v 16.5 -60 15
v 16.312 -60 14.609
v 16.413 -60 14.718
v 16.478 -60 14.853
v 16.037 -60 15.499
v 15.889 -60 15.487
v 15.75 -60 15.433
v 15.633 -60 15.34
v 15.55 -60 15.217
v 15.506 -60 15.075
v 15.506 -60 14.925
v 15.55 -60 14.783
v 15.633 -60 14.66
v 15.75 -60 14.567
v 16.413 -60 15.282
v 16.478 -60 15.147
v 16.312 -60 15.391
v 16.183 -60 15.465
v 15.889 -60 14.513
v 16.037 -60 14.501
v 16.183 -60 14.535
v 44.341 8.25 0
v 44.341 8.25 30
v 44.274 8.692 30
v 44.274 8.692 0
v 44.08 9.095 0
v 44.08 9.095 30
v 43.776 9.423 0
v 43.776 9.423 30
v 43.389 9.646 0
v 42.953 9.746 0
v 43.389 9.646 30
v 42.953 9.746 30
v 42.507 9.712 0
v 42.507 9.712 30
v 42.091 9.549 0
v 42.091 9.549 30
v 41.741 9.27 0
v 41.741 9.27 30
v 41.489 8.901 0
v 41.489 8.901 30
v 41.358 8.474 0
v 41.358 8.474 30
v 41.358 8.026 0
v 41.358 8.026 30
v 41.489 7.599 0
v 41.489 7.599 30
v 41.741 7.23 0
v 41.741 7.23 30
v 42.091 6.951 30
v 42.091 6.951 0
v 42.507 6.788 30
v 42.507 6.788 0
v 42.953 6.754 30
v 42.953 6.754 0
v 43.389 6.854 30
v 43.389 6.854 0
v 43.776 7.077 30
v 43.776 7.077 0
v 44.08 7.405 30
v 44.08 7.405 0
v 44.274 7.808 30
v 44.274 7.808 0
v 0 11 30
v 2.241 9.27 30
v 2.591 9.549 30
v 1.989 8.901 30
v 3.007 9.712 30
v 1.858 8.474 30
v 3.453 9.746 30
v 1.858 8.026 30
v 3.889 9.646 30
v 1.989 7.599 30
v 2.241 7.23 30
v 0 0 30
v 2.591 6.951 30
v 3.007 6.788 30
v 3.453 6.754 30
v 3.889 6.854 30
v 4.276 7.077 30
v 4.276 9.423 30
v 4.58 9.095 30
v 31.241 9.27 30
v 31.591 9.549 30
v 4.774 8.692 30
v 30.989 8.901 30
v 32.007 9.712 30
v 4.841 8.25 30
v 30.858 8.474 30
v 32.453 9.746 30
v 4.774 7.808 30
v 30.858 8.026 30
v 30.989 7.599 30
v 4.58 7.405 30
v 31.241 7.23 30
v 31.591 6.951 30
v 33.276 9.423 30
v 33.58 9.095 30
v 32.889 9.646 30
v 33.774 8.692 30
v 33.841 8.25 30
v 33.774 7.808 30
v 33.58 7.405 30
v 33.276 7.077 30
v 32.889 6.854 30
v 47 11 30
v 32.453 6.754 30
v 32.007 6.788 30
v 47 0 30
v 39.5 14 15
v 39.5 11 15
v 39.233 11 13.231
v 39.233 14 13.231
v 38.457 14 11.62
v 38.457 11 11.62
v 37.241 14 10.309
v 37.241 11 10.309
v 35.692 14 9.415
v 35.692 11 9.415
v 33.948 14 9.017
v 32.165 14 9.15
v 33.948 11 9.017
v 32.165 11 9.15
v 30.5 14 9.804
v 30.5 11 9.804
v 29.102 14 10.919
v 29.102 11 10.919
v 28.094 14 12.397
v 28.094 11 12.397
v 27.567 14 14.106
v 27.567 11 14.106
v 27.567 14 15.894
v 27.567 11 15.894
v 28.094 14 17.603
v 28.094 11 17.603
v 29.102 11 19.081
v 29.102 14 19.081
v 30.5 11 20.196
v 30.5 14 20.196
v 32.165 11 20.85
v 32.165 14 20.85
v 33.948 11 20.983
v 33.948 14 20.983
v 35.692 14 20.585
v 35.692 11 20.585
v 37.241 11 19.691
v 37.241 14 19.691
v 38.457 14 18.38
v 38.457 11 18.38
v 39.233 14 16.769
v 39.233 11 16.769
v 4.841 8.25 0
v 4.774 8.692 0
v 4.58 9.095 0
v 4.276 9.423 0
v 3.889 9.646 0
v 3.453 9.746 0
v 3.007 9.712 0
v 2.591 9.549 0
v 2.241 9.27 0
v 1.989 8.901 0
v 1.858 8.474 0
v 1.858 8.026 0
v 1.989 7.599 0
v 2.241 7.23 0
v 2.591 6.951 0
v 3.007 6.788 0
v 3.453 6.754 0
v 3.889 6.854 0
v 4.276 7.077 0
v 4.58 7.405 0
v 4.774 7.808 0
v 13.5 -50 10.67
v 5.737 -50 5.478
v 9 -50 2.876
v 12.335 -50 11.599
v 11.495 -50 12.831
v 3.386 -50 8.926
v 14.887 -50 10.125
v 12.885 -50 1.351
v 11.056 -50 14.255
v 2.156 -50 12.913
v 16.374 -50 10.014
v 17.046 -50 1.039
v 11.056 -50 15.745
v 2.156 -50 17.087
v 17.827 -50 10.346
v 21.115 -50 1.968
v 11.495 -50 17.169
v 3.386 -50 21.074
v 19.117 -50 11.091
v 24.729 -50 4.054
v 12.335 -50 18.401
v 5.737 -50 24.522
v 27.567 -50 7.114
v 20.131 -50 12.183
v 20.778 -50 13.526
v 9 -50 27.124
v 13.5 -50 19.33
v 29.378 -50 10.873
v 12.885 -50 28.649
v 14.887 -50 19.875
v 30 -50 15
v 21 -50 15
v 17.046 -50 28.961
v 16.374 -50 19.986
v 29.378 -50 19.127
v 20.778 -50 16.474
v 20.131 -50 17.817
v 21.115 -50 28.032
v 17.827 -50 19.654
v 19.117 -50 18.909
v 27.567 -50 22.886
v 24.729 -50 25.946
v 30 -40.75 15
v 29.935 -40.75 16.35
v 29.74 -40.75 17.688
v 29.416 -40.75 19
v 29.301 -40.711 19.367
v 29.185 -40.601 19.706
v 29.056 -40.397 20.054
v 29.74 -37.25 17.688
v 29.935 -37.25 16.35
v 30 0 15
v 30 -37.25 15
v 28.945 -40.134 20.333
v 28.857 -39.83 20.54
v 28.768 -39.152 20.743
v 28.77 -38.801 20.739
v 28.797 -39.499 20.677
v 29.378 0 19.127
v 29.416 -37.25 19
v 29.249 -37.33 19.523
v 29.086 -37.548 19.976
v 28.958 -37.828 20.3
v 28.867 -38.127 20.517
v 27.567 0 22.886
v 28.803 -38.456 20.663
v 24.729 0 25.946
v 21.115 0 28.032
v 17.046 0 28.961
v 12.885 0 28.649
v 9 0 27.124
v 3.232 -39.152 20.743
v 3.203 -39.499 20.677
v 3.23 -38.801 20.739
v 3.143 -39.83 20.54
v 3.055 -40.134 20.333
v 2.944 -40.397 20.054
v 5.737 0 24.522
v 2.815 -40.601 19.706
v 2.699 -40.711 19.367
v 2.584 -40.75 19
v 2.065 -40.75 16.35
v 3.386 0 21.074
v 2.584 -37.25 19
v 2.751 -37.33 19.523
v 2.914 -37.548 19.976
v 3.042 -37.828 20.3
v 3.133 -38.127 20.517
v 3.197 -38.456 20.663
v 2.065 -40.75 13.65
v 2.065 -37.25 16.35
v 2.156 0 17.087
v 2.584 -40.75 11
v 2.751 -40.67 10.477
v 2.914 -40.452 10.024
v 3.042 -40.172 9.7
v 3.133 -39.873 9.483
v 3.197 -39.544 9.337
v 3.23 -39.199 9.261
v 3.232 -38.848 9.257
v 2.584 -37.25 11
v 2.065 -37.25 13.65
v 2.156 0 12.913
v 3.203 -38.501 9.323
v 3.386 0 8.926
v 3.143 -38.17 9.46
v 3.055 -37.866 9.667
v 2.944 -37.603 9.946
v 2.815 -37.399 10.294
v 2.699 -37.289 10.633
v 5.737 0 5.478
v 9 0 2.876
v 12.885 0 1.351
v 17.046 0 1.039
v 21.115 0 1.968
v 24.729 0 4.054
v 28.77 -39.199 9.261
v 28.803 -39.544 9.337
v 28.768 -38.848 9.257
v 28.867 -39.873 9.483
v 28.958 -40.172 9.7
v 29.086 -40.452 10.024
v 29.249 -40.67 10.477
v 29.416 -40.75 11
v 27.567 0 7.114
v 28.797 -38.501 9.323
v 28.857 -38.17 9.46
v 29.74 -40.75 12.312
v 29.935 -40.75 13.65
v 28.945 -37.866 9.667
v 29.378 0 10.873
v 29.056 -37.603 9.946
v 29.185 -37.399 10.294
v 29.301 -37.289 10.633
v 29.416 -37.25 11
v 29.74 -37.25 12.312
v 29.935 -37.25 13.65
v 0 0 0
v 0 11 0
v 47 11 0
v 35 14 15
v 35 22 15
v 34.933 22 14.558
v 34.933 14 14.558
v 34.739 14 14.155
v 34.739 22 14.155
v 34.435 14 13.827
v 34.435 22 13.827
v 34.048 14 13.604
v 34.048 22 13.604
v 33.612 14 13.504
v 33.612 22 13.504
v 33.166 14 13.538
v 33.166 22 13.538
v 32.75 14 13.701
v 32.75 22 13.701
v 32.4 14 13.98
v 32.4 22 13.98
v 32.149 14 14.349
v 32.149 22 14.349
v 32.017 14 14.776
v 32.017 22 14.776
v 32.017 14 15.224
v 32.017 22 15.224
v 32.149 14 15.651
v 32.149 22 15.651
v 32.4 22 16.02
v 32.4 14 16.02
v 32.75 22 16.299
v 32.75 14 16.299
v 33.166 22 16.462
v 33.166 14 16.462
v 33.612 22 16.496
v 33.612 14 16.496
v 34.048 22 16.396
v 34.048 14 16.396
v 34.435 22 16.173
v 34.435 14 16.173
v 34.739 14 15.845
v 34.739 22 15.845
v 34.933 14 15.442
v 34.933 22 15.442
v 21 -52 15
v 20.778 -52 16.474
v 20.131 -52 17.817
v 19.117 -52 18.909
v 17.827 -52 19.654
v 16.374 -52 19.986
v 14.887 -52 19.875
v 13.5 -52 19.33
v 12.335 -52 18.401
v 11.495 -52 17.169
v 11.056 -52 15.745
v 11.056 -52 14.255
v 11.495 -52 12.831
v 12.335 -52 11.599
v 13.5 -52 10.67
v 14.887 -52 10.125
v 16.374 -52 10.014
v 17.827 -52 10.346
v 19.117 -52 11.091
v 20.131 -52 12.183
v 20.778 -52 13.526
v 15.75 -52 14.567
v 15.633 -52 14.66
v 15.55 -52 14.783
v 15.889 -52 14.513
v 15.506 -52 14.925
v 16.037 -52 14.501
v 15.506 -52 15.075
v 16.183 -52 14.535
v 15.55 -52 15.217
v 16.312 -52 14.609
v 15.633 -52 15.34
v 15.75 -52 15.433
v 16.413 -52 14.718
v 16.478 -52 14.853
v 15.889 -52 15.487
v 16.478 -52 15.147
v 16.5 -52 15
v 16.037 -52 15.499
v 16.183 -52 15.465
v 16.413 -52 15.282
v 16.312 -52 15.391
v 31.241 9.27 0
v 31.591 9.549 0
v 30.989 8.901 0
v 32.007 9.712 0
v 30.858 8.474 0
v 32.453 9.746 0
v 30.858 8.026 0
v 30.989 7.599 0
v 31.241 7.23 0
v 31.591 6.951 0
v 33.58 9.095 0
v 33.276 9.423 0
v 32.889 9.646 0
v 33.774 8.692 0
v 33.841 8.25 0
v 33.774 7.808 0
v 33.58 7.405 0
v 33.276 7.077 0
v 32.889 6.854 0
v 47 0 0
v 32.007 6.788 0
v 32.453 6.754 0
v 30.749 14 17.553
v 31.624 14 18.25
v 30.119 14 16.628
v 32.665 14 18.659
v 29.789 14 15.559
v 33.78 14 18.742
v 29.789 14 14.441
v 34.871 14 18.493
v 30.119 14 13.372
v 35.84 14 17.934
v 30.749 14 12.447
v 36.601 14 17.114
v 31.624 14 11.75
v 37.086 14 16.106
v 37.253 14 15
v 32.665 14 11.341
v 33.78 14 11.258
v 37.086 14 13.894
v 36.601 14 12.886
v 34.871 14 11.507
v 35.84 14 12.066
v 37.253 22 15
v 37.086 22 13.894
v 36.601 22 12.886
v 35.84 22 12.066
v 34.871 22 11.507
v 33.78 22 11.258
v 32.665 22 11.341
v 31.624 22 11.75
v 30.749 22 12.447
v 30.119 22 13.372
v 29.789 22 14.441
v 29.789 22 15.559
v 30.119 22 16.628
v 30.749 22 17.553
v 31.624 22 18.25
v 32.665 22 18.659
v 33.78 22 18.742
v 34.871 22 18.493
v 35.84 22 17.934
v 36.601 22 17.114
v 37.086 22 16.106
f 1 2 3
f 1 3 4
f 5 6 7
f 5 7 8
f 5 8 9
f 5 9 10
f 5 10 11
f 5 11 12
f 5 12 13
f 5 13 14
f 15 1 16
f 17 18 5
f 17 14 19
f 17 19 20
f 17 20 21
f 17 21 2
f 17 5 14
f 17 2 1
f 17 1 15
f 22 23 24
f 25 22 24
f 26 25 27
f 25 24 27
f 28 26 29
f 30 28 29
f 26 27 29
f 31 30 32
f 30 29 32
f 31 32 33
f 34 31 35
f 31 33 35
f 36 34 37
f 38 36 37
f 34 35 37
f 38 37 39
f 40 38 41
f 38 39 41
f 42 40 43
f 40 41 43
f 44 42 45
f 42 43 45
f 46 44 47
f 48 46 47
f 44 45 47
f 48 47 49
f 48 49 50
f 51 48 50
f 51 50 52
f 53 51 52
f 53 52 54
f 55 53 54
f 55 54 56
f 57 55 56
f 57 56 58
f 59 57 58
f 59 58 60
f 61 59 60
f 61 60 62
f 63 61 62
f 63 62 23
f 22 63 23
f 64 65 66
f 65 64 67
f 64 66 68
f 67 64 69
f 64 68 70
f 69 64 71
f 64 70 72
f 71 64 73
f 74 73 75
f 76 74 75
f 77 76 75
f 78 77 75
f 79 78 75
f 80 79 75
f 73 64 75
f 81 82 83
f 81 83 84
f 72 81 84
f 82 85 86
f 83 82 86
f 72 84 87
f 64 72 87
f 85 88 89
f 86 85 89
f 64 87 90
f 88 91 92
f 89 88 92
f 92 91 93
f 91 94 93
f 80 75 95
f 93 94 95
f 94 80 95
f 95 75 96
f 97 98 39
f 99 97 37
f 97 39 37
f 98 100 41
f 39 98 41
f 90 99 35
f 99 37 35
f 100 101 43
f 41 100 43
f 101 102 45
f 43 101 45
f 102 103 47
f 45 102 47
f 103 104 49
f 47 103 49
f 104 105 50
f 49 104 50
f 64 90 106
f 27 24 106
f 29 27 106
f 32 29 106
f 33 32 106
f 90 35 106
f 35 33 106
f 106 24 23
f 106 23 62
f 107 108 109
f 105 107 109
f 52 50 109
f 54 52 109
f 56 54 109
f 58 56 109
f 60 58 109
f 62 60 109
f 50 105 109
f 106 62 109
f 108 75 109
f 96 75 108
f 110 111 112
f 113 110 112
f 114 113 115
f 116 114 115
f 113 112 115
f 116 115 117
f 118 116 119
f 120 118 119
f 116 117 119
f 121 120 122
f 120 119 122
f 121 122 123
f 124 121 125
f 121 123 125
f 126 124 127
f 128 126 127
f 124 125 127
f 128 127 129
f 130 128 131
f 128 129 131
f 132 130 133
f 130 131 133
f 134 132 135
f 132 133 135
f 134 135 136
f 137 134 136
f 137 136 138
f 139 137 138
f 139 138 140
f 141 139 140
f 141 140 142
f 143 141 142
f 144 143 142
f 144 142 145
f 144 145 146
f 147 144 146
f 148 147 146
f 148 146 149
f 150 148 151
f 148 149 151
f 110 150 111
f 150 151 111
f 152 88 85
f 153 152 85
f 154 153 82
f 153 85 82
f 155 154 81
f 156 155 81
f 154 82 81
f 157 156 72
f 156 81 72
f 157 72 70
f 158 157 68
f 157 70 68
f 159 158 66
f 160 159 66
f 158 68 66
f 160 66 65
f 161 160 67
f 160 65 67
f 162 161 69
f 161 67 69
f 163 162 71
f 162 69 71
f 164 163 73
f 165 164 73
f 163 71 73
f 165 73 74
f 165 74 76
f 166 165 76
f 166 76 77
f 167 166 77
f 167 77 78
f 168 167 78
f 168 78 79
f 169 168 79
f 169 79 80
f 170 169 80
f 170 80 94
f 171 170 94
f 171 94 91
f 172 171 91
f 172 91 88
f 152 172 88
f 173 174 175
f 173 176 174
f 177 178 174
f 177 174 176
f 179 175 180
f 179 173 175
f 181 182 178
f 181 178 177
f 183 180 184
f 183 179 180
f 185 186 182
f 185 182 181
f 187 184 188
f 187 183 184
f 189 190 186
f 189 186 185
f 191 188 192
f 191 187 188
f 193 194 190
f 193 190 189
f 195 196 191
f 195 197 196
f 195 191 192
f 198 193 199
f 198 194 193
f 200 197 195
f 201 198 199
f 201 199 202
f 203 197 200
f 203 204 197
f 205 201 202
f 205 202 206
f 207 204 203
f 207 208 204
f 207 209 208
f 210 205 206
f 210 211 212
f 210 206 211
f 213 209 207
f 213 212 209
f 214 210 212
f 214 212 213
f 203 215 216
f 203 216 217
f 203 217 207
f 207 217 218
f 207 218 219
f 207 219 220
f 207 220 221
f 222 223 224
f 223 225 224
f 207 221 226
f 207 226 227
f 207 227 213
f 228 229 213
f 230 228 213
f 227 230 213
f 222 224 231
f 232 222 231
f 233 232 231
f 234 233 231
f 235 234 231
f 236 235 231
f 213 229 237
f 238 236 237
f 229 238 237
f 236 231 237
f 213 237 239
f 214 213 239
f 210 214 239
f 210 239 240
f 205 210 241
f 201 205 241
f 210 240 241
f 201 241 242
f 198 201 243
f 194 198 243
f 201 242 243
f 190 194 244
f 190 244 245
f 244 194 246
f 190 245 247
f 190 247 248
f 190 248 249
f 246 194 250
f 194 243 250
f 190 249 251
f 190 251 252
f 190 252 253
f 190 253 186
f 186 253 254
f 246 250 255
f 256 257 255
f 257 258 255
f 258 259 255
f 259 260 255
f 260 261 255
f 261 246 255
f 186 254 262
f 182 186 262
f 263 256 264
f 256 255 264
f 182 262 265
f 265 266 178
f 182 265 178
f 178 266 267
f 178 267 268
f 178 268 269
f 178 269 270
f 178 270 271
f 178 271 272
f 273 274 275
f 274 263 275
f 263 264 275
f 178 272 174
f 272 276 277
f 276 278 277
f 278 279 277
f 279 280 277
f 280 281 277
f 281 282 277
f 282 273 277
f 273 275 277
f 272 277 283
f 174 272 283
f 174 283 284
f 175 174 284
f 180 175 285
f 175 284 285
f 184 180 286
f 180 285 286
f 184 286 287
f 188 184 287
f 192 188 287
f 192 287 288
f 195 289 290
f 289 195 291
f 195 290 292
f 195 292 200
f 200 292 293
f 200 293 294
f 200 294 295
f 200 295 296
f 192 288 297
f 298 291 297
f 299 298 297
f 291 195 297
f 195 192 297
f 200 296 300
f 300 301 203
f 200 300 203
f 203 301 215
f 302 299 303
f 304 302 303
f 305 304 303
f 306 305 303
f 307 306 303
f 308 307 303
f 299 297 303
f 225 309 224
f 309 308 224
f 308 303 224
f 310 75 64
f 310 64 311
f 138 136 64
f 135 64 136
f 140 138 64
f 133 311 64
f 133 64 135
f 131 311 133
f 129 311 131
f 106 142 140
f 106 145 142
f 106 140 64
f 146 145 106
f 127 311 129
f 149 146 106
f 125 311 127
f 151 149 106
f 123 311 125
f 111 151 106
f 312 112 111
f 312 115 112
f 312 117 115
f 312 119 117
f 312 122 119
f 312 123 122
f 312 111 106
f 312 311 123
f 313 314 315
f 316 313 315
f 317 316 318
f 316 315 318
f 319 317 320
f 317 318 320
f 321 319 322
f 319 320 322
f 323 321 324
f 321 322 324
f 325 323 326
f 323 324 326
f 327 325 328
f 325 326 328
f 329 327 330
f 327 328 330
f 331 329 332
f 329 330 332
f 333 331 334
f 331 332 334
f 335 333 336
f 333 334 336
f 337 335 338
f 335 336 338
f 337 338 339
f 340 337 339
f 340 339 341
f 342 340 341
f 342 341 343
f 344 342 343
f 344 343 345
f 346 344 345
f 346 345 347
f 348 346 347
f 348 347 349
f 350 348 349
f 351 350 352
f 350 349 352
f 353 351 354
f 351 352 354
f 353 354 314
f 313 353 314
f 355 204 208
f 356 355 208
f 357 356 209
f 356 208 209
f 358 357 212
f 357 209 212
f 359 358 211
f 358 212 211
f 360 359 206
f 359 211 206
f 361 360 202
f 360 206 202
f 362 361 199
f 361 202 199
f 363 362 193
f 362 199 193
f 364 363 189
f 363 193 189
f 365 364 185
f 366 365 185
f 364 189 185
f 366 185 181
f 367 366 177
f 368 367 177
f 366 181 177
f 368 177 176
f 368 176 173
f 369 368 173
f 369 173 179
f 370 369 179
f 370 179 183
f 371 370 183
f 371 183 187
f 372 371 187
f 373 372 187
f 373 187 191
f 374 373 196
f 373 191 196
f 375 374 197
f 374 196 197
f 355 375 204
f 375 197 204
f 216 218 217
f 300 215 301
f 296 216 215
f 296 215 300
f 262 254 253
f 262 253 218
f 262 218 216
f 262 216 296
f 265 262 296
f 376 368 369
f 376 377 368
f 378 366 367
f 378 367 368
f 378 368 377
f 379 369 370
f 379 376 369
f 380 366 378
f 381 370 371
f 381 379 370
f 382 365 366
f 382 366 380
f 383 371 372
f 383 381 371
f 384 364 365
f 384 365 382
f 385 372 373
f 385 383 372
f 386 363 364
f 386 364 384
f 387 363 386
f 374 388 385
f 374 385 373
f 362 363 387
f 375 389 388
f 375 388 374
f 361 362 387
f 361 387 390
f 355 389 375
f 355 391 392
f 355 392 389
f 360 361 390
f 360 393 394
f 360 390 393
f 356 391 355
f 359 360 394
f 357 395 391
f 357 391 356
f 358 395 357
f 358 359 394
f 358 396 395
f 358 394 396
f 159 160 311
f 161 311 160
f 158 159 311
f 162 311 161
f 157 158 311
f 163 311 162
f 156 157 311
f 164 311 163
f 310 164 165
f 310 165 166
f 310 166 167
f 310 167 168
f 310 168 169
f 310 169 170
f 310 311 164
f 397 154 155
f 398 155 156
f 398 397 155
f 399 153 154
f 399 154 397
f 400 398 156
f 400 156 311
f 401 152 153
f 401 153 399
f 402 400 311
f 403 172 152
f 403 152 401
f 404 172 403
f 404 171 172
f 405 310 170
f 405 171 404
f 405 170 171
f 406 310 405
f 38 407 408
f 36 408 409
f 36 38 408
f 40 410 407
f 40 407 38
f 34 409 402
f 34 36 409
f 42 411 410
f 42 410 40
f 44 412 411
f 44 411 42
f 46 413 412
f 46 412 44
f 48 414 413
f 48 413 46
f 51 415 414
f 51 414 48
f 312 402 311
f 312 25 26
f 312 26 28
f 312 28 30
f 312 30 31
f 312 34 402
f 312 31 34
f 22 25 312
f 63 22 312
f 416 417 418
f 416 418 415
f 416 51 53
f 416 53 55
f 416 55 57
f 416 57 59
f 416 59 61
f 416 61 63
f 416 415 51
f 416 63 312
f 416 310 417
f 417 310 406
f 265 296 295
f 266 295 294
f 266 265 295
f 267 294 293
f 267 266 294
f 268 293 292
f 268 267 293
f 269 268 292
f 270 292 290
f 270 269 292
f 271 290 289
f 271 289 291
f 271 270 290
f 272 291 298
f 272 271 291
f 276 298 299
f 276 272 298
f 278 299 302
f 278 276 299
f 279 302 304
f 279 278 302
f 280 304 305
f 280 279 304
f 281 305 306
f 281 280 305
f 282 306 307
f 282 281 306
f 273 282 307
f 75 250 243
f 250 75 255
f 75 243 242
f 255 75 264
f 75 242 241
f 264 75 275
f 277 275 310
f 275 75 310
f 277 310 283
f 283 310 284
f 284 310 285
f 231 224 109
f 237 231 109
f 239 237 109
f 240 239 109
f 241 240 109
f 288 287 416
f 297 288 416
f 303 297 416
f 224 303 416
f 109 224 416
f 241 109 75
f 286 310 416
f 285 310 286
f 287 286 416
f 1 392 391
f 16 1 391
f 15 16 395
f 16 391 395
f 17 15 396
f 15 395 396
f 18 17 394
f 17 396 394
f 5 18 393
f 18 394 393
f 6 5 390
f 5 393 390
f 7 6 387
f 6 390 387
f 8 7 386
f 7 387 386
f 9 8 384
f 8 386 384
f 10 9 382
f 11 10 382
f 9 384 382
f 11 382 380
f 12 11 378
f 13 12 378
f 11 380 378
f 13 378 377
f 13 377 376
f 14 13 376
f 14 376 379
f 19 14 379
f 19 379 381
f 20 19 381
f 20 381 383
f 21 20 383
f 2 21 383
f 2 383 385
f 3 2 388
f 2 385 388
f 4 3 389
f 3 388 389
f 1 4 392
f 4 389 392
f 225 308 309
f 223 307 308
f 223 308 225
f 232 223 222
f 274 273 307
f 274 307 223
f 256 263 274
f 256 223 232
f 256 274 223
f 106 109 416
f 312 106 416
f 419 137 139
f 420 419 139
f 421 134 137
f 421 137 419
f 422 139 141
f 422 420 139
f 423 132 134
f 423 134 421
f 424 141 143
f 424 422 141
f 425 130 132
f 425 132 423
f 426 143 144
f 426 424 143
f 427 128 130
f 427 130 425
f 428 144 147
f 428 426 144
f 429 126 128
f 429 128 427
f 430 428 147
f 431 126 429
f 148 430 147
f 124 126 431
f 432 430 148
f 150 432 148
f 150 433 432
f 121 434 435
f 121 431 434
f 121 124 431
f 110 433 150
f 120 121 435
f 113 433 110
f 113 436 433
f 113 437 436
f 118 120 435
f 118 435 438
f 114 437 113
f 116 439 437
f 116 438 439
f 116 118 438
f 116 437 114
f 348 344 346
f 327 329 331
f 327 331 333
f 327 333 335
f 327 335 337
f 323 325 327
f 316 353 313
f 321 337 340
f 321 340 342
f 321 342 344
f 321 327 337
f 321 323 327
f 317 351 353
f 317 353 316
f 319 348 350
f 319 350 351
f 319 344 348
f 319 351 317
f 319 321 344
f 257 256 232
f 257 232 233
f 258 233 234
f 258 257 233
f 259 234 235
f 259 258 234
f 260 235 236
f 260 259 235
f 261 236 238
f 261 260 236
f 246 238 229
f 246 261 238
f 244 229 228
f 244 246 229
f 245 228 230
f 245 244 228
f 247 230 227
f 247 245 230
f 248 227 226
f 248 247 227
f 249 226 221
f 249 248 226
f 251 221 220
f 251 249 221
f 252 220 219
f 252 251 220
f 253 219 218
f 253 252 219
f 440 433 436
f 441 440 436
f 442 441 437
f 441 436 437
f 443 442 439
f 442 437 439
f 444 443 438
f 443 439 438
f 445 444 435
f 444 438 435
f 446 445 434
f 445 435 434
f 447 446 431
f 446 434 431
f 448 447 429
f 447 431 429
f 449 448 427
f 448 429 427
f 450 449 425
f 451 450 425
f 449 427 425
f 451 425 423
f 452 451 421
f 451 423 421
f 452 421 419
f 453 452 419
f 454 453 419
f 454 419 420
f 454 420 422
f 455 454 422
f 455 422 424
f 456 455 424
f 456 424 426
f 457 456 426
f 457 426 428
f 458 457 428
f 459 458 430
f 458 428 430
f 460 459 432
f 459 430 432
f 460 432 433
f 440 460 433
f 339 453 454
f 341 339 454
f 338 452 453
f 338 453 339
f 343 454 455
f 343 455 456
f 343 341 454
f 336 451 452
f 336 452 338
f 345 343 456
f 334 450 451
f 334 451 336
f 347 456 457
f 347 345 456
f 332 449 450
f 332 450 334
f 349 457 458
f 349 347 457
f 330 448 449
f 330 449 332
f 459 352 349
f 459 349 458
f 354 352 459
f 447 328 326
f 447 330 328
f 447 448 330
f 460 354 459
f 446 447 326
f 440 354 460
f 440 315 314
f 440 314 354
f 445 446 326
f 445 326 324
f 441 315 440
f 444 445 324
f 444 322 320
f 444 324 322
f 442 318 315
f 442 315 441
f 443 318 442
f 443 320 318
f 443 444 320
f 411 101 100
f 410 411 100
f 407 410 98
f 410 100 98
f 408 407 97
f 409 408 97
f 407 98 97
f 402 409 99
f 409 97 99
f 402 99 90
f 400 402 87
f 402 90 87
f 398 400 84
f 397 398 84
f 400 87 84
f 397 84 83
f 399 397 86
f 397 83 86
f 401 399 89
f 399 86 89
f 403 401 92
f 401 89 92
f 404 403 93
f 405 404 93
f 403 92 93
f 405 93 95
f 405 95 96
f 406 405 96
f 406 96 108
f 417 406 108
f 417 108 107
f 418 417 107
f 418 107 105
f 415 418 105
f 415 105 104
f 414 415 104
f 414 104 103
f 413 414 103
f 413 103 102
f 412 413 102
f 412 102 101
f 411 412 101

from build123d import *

# Parameters (mm, degrees)
SKETCH_1_W          = 47
SKETCH_1_H          = 30
EXTRUDE_1_DEPTH     = 11
SKETCH_2_R          = 6
EXTRUDE_2_DEPTH     = 3
SKETCH_3_R          = 3.75277675
EXTRUDE_3_DEPTH     = 8
SKETCH_4_R          = 14
EXTRUDE_4_DEPTH     = 50
SKETCH_5_R          = 5
EXTRUDE_5_DEPTH     = 2
SKETCH_6_R          = 1.5
CUT_EXTRUDE_1_DEPTH = 31
CUT_EXTRUDE_2_DEPTH = 48
SKETCH_9_R          = 1.5
CUT_EXTRUDE_3_DEPTH = 8
SKETCH_11_R         = 0.5
EXTRUDE_6_DEPTH     = 8


with BuildPart() as part:
    # 草图1 → 凸台-拉伸1 (new body)
    with BuildSketch(Plane(origin=(0, 0, 0), x_dir=(1, 0, 0), z_dir=(0, 1, 0))):
        with Locations((23.5, -15)):
            Rectangle(SKETCH_1_W, SKETCH_1_H)
    extrude(amount=EXTRUDE_1_DEPTH)

    # 草图2 → 凸台-拉伸2 (add)
    with BuildSketch(Plane(origin=(0, 11, 0), x_dir=(1, 0, 0), z_dir=(0, 1, 0))):
        with Locations((33.5, -15)):
            Circle(SKETCH_2_R)
    extrude(amount=EXTRUDE_2_DEPTH)

    # 草图3 → 凸台-拉伸3 (add)
    with BuildSketch(Plane(origin=(0, 14, 0), x_dir=(1, 0, 0), z_dir=(0, 1, 0))):
        with Locations((33.5, -15)):
            Circle(SKETCH_3_R)
    extrude(amount=EXTRUDE_3_DEPTH)

    # 草图4 → 凸台-拉伸4 (add)
    with BuildSketch(Plane.XZ):
        with Locations((16, 15)):
            Circle(SKETCH_4_R)
    extrude(amount=EXTRUDE_4_DEPTH)

    # 草图5 → 凸台-拉伸5 (add)
    with BuildSketch(Plane.XZ.offset(50)):
        with Locations((16, 15)):
            Circle(SKETCH_5_R)
    extrude(amount=EXTRUDE_5_DEPTH)

    # 草图6 → 切除-拉伸1 (cut, through all)
    with BuildSketch(Plane.XY.offset(30)):
        with Locations((3.340757383, 8.25)):
            Circle(SKETCH_6_R)
        with Locations((32.340757383, 8.25)):
            Circle(SKETCH_6_R)
        with Locations((42.840757383, 8.25)):
            Circle(SKETCH_6_R)
    extrude(amount=-CUT_EXTRUDE_1_DEPTH, mode=Mode.SUBTRACT)

    # 草图7 → 切除-拉伸2 (cut, through all)
    with BuildSketch(Plane.ZY):
        with BuildLine():
            Line((11, -37.25), (19, -37.25))
            ThreePointArc((19, -37.25), (20.75, -39), (19, -40.75))
            Line((19, -40.75), (11, -40.75))
            ThreePointArc((11, -40.75), (9.25, -39), (11, -37.25))
        make_face()
    extrude(amount=-CUT_EXTRUDE_2_DEPTH, mode=Mode.SUBTRACT)

    # 草图9 → 切除-拉伸3 (cut)
    with BuildSketch(Plane(origin=(0, 22, 0), x_dir=(1, 0, 0), z_dir=(0, 1, 0))):
        with Locations((33.5, -15)):
            Circle(SKETCH_9_R)
    extrude(amount=-CUT_EXTRUDE_3_DEPTH, mode=Mode.SUBTRACT)

    # 草图11 → 凸台-拉伸6 (add)
    with BuildSketch(Plane.XZ.offset(52)):
        with Locations((16, 15)):
            Circle(SKETCH_11_R)
    extrude(amount=EXTRUDE_6_DEPTH)


solid = part.part
